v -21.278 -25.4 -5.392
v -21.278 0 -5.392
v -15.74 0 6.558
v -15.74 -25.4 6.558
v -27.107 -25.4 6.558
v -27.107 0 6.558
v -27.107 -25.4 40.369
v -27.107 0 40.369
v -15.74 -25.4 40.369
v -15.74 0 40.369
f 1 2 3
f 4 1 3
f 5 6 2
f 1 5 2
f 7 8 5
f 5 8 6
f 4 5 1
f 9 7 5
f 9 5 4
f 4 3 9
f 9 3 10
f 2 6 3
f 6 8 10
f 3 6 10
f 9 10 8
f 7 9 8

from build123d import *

# Parameters (mm, degrees)
F2_DEPTH = 25.4


with BuildPart() as f2:
    # F1 (on face) → F2 (new body)
    with BuildSketch(Plane.XZ):
        Polygon((-15.739672, 6.558197), (-15.739672, 40.369343), (-27.107213, 40.369343), (-27.107213, 6.558197), (-21.277705, -5.392295), align=None)
    extrude(amount=F2_DEPTH)


solid = f2.part
